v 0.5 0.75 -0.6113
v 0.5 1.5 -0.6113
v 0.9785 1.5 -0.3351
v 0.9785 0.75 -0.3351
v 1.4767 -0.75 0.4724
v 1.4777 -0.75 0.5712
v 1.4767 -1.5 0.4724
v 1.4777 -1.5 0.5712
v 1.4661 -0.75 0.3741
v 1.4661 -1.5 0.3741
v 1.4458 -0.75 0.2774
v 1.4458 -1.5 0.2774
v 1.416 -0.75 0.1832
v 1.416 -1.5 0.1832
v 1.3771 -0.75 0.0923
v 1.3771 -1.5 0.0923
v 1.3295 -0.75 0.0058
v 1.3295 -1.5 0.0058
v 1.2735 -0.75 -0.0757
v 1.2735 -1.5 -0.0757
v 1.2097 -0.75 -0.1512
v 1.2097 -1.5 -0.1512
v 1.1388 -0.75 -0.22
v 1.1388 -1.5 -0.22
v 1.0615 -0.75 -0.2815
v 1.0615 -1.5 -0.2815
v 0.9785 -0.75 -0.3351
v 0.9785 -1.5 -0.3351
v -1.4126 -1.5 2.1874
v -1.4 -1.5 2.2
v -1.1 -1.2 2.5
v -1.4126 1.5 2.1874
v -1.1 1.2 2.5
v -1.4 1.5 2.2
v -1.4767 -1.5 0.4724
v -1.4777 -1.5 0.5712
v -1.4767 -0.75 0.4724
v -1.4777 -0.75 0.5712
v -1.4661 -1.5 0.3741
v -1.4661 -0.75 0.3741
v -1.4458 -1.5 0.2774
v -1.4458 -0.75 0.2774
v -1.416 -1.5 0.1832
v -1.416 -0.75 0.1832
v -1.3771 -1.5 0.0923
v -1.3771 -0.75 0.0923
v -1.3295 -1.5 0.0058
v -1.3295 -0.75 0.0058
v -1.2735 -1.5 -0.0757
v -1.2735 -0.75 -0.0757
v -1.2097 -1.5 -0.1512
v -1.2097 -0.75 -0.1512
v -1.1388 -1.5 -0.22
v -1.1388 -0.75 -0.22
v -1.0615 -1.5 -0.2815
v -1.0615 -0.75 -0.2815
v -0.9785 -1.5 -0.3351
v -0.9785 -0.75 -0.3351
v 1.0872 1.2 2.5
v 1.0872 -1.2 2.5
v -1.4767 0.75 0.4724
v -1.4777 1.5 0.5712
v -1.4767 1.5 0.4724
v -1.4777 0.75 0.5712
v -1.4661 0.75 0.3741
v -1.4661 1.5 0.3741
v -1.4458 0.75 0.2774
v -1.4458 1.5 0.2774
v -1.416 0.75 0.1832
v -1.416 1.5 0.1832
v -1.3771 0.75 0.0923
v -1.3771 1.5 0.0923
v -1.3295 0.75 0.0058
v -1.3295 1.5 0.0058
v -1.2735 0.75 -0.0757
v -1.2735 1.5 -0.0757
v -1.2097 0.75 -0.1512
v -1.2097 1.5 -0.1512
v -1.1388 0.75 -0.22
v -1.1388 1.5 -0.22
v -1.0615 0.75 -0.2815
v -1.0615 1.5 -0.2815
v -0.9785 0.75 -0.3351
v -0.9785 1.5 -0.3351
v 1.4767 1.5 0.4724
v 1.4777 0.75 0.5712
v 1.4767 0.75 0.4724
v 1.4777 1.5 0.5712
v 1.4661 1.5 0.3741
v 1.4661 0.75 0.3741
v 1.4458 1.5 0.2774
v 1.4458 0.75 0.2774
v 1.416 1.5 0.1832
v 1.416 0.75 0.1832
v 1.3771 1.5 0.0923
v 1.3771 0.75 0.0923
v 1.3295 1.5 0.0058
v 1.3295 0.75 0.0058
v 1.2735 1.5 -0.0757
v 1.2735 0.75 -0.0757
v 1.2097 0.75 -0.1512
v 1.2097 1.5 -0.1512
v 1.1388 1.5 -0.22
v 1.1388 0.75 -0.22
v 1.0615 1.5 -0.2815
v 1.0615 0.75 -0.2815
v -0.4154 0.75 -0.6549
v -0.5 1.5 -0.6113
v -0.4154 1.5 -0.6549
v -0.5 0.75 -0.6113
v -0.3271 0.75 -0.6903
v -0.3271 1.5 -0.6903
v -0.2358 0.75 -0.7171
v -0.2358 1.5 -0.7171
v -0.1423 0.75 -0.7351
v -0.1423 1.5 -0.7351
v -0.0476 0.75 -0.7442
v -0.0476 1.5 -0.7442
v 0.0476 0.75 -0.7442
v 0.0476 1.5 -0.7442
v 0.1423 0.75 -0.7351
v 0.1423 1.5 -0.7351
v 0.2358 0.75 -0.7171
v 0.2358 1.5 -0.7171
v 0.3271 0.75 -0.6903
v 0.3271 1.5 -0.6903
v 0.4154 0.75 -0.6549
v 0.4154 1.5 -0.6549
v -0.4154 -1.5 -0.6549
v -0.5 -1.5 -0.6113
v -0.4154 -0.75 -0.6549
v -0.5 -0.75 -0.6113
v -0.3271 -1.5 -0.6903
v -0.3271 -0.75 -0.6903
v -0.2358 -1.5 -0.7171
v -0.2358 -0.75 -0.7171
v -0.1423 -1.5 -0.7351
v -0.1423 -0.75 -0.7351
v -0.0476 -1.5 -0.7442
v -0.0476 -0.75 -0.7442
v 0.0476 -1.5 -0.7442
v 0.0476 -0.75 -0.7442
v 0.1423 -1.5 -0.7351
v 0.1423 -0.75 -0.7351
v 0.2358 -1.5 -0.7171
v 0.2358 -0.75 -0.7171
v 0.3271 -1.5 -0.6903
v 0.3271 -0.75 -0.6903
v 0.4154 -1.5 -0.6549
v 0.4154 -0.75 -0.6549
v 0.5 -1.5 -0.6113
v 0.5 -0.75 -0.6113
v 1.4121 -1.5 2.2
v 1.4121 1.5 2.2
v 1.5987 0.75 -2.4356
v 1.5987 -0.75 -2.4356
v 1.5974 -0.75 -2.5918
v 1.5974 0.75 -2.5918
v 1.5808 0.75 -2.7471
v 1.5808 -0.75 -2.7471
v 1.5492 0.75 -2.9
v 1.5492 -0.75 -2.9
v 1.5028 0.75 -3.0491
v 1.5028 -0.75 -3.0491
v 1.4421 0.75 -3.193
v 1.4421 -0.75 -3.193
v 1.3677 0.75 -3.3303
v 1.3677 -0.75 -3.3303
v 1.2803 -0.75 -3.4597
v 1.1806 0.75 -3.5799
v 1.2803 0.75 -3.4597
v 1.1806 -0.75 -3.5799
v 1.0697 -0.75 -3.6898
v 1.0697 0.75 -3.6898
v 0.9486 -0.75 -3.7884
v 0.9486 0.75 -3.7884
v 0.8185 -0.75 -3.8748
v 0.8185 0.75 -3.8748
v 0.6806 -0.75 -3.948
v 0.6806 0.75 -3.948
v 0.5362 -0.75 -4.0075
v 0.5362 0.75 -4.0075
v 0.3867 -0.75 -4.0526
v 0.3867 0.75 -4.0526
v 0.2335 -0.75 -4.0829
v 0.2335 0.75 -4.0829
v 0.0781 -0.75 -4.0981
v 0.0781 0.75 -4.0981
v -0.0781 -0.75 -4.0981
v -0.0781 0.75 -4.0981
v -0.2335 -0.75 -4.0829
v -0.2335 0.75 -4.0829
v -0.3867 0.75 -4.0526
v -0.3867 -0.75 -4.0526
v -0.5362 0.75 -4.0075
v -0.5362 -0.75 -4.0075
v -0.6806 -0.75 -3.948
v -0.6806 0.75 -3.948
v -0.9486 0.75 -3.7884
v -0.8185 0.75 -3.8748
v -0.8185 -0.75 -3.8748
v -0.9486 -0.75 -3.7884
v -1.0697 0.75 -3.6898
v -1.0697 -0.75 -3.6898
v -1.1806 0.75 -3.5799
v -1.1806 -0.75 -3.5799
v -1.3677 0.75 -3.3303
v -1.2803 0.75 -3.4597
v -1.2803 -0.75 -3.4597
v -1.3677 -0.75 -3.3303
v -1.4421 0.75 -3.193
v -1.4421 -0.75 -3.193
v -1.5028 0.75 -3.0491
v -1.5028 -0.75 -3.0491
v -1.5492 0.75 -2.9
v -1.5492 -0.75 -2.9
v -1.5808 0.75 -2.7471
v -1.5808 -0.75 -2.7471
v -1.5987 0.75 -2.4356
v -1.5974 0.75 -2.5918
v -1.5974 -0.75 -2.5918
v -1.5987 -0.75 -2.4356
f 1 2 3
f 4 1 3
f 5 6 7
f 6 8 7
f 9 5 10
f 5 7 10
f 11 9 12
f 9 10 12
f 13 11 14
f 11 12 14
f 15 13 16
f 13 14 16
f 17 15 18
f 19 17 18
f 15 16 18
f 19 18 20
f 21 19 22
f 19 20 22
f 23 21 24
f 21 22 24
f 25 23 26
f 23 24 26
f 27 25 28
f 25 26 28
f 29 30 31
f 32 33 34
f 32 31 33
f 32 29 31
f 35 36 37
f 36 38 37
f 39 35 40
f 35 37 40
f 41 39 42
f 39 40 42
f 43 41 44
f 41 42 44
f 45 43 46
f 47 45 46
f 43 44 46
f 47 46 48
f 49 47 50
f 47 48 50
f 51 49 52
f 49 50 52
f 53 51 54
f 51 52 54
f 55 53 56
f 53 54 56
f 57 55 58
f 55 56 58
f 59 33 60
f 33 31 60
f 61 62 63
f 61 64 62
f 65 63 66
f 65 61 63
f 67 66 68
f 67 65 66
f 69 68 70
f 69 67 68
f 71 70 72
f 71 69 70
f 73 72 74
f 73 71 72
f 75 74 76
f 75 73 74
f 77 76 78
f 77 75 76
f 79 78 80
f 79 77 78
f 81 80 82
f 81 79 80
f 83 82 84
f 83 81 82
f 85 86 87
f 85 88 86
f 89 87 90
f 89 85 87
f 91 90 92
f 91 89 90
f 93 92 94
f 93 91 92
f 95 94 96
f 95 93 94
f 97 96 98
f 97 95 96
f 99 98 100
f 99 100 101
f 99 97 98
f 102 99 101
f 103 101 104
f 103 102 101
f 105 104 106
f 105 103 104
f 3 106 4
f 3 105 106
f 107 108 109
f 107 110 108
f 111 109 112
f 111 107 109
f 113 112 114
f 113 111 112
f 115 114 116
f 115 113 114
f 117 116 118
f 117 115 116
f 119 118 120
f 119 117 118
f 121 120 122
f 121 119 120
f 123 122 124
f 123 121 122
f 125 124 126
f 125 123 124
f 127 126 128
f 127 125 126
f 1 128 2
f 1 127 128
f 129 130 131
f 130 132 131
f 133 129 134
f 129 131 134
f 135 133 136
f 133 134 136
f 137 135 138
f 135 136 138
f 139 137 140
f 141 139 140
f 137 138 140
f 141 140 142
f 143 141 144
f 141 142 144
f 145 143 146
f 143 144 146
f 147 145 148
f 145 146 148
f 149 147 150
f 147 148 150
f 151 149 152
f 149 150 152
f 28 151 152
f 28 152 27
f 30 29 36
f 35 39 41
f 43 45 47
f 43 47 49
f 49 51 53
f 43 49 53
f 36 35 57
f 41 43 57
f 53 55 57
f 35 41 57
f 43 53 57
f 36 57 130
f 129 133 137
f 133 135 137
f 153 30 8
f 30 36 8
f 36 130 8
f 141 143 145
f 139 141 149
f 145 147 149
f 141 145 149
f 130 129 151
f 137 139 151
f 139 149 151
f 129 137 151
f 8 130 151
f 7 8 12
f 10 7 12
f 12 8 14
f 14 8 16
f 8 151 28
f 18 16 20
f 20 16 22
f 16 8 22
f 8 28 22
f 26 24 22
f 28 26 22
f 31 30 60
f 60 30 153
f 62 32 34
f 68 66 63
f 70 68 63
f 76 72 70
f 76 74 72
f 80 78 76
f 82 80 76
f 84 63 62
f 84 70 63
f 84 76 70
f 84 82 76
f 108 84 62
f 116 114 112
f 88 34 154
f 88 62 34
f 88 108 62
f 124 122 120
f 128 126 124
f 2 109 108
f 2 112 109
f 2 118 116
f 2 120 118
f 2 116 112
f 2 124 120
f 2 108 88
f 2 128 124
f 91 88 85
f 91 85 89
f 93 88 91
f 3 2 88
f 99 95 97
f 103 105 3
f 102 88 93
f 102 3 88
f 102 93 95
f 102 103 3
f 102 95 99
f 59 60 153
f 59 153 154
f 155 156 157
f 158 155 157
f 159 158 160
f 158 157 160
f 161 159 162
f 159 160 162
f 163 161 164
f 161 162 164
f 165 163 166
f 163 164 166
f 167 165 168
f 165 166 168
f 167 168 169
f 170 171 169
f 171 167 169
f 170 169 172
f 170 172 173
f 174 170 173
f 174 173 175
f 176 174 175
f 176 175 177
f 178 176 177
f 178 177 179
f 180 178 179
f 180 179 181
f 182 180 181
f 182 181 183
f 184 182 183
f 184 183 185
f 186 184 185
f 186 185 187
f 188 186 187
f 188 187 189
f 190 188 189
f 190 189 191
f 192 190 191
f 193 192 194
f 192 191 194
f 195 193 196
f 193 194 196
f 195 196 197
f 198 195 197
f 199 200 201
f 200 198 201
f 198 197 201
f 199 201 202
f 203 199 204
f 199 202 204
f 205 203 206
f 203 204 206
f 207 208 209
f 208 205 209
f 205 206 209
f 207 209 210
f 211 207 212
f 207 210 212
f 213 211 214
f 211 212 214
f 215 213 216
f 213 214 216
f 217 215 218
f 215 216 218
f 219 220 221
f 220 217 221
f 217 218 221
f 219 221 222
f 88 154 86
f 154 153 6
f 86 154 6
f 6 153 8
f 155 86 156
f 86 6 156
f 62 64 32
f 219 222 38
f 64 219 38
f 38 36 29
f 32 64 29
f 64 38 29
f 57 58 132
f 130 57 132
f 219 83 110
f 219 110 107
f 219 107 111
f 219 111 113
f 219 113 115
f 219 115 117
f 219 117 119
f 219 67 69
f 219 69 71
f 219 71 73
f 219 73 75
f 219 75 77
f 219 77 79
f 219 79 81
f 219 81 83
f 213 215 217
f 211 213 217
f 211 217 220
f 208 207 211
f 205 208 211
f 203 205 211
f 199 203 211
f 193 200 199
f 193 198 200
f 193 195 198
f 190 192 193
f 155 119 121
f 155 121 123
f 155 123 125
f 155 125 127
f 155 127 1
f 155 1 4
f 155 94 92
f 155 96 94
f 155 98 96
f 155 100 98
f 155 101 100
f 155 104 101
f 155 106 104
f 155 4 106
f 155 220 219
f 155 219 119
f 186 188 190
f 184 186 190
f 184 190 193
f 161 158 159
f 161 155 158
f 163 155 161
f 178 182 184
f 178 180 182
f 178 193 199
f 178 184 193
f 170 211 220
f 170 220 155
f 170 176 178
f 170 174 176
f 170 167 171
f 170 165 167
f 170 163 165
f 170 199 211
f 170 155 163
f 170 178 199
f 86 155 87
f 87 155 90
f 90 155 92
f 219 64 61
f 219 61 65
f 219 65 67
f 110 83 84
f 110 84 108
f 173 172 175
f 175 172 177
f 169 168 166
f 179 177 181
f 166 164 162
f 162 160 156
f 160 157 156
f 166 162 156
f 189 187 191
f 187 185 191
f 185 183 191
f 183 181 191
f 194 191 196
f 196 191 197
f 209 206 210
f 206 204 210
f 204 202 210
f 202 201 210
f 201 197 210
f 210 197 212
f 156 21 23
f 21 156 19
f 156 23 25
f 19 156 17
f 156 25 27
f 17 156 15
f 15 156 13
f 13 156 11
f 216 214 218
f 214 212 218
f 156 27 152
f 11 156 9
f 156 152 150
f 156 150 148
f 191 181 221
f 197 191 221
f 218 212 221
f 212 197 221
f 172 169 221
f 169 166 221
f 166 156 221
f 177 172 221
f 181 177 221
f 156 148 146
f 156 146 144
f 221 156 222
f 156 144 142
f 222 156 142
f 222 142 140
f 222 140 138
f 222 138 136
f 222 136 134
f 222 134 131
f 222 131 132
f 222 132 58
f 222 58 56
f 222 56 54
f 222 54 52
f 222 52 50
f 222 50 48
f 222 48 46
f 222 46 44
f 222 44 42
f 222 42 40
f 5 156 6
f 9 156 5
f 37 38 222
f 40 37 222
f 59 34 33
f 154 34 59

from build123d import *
from OCP.BRepFilletAPI import BRepFilletAPI_MakeChamfer

# Parameters (mm, degrees)
BOSS_EXTRUDE1_DEPTH      = 1.5
BOSS_EXTRUDE1_DEPTH_BACK = 1.5
SKETCH1_R                = 1.6
CUT_EXTRUDE1_DEPTH       = 0.75
CUT_EXTRUDE2_DEPTH       = 0.75
FILLET1_R                = 1
CHAMFER1_SIZE            = 0.3
CHAMFER1_SIZE2           = 0.312837622


with BuildPart() as part:
    # Sketch1 → Boss-Extrude1 (new, two sides: drawn at the far end of the back side and taken through both)
    with BuildSketch(Plane(origin=(0, 0, 0), x_dir=(1, 0, 0), z_dir=(0, 1, 0)).offset(-BOSS_EXTRUDE1_DEPTH_BACK)):
        with BuildLine():
            ThreePointArc((1.59870493, 2.43563738), (0, 0.9), (-1.59870493, 2.43563738))
            Line((-1.59870493, 2.43563738), (-1.4, -2.5))
            Line((-1.4, -2.5), (1.4, -2.5))
            Line((1.4, -2.5), (1.59870493, 2.43563738))
        make_face()
        with Locations((0, 2.5)):
            Circle(SKETCH1_R)
    extrude(amount=BOSS_EXTRUDE1_DEPTH + BOSS_EXTRUDE1_DEPTH_BACK)

    # Sketch2 → Cut-Extrude1 (cut)
    with BuildSketch(Plane.XZ.offset(1.5)):
        Polygon((0, -0.9), (2.885753251, 0.766090416), (2.885753251, -2.050590863), (2.110091131, -4.50528075), (-1.600263029, -4.441671147), (-3.669548881, -0.857562917), (-3.144856004, 0.915683461), align=None)
    extrude(amount=-CUT_EXTRUDE1_DEPTH, mode=Mode.SUBTRACT)

    # Sketch3 → Cut-Extrude2 (cut)
    with BuildSketch(Plane(origin=(0, 1.5, 0), x_dir=(1, 0, 0), z_dir=(0, 1, 0))):
        Polygon((0, 0.9), (2.885753251, -0.766090416), (2.885753251, 2.050590863), (2.110091131, 4.50528075), (-1.600263029, 4.441671147), (-3.669548881, 0.857562917), (-3.144856004, -0.915683461), align=None)
    extrude(amount=-CUT_EXTRUDE2_DEPTH, mode=Mode.SUBTRACT)

    # Fillet1
    fillet1_edges = [part.edges().sort_by_distance(p)[0] for p in [
        (-1.501970059, -1.125, -0.032837182),
        (1.501970059, -1.125, -0.032837182),
        (0, -1.125, -0.9),
        (-1.501970059, 1.125, -0.032837182),
        (1.501970059, 1.125, -0.032837182),
        (0, 1.125, -0.9),
    ]]
    fillet(fillet1_edges, radius=FILLET1_R)

    # Chamfer1: one chamfer whose edges measure the first distance from different faces: ONE call of the kernel's chamfer builder (chamfer() names one face for all edges)
    chamfer1_edges_1 = [part.edges().sort_by_distance(p)[0] for p in [
        (0, 1.5, 2.5),
        (0, -1.5, 2.5),
    ]]
    chamfer1_edges_2 = [part.edges().sort_by_distance(p)[0] for p in [
        (1.4, 0, 2.5),
    ]]
    chamfer1_side_2 = [part.faces().sort_by_distance(p)[0] for p in [
        (1.482345448, 0, 0.454619096),
    ]]
    chamfer1_edges_3 = [part.edges().sort_by_distance(p)[0] for p in [
        (-1.4, 0, 2.5),
    ]]
    chamfer1_side_3 = [part.faces().sort_by_distance(p)[0] for p in [
        (0, 0, 2.5),
    ]]
    chamfer1 = BRepFilletAPI_MakeChamfer(part.part.solid().wrapped)
    for e in chamfer1_edges_1:
        chamfer1.Add(CHAMFER1_SIZE, e.wrapped)
    for e in chamfer1_edges_2:
        chamfer1.Add(CHAMFER1_SIZE, CHAMFER1_SIZE2, e.wrapped, chamfer1_side_2[0].wrapped)  # the first distance lies on this face
    for e in chamfer1_edges_3:
        chamfer1.Add(CHAMFER1_SIZE, CHAMFER1_SIZE2, e.wrapped, chamfer1_side_3[0].wrapped)  # the first distance lies on this face
    add(Compound.cast(chamfer1.Shape()), mode=Mode.REPLACE)


solid = part.part
